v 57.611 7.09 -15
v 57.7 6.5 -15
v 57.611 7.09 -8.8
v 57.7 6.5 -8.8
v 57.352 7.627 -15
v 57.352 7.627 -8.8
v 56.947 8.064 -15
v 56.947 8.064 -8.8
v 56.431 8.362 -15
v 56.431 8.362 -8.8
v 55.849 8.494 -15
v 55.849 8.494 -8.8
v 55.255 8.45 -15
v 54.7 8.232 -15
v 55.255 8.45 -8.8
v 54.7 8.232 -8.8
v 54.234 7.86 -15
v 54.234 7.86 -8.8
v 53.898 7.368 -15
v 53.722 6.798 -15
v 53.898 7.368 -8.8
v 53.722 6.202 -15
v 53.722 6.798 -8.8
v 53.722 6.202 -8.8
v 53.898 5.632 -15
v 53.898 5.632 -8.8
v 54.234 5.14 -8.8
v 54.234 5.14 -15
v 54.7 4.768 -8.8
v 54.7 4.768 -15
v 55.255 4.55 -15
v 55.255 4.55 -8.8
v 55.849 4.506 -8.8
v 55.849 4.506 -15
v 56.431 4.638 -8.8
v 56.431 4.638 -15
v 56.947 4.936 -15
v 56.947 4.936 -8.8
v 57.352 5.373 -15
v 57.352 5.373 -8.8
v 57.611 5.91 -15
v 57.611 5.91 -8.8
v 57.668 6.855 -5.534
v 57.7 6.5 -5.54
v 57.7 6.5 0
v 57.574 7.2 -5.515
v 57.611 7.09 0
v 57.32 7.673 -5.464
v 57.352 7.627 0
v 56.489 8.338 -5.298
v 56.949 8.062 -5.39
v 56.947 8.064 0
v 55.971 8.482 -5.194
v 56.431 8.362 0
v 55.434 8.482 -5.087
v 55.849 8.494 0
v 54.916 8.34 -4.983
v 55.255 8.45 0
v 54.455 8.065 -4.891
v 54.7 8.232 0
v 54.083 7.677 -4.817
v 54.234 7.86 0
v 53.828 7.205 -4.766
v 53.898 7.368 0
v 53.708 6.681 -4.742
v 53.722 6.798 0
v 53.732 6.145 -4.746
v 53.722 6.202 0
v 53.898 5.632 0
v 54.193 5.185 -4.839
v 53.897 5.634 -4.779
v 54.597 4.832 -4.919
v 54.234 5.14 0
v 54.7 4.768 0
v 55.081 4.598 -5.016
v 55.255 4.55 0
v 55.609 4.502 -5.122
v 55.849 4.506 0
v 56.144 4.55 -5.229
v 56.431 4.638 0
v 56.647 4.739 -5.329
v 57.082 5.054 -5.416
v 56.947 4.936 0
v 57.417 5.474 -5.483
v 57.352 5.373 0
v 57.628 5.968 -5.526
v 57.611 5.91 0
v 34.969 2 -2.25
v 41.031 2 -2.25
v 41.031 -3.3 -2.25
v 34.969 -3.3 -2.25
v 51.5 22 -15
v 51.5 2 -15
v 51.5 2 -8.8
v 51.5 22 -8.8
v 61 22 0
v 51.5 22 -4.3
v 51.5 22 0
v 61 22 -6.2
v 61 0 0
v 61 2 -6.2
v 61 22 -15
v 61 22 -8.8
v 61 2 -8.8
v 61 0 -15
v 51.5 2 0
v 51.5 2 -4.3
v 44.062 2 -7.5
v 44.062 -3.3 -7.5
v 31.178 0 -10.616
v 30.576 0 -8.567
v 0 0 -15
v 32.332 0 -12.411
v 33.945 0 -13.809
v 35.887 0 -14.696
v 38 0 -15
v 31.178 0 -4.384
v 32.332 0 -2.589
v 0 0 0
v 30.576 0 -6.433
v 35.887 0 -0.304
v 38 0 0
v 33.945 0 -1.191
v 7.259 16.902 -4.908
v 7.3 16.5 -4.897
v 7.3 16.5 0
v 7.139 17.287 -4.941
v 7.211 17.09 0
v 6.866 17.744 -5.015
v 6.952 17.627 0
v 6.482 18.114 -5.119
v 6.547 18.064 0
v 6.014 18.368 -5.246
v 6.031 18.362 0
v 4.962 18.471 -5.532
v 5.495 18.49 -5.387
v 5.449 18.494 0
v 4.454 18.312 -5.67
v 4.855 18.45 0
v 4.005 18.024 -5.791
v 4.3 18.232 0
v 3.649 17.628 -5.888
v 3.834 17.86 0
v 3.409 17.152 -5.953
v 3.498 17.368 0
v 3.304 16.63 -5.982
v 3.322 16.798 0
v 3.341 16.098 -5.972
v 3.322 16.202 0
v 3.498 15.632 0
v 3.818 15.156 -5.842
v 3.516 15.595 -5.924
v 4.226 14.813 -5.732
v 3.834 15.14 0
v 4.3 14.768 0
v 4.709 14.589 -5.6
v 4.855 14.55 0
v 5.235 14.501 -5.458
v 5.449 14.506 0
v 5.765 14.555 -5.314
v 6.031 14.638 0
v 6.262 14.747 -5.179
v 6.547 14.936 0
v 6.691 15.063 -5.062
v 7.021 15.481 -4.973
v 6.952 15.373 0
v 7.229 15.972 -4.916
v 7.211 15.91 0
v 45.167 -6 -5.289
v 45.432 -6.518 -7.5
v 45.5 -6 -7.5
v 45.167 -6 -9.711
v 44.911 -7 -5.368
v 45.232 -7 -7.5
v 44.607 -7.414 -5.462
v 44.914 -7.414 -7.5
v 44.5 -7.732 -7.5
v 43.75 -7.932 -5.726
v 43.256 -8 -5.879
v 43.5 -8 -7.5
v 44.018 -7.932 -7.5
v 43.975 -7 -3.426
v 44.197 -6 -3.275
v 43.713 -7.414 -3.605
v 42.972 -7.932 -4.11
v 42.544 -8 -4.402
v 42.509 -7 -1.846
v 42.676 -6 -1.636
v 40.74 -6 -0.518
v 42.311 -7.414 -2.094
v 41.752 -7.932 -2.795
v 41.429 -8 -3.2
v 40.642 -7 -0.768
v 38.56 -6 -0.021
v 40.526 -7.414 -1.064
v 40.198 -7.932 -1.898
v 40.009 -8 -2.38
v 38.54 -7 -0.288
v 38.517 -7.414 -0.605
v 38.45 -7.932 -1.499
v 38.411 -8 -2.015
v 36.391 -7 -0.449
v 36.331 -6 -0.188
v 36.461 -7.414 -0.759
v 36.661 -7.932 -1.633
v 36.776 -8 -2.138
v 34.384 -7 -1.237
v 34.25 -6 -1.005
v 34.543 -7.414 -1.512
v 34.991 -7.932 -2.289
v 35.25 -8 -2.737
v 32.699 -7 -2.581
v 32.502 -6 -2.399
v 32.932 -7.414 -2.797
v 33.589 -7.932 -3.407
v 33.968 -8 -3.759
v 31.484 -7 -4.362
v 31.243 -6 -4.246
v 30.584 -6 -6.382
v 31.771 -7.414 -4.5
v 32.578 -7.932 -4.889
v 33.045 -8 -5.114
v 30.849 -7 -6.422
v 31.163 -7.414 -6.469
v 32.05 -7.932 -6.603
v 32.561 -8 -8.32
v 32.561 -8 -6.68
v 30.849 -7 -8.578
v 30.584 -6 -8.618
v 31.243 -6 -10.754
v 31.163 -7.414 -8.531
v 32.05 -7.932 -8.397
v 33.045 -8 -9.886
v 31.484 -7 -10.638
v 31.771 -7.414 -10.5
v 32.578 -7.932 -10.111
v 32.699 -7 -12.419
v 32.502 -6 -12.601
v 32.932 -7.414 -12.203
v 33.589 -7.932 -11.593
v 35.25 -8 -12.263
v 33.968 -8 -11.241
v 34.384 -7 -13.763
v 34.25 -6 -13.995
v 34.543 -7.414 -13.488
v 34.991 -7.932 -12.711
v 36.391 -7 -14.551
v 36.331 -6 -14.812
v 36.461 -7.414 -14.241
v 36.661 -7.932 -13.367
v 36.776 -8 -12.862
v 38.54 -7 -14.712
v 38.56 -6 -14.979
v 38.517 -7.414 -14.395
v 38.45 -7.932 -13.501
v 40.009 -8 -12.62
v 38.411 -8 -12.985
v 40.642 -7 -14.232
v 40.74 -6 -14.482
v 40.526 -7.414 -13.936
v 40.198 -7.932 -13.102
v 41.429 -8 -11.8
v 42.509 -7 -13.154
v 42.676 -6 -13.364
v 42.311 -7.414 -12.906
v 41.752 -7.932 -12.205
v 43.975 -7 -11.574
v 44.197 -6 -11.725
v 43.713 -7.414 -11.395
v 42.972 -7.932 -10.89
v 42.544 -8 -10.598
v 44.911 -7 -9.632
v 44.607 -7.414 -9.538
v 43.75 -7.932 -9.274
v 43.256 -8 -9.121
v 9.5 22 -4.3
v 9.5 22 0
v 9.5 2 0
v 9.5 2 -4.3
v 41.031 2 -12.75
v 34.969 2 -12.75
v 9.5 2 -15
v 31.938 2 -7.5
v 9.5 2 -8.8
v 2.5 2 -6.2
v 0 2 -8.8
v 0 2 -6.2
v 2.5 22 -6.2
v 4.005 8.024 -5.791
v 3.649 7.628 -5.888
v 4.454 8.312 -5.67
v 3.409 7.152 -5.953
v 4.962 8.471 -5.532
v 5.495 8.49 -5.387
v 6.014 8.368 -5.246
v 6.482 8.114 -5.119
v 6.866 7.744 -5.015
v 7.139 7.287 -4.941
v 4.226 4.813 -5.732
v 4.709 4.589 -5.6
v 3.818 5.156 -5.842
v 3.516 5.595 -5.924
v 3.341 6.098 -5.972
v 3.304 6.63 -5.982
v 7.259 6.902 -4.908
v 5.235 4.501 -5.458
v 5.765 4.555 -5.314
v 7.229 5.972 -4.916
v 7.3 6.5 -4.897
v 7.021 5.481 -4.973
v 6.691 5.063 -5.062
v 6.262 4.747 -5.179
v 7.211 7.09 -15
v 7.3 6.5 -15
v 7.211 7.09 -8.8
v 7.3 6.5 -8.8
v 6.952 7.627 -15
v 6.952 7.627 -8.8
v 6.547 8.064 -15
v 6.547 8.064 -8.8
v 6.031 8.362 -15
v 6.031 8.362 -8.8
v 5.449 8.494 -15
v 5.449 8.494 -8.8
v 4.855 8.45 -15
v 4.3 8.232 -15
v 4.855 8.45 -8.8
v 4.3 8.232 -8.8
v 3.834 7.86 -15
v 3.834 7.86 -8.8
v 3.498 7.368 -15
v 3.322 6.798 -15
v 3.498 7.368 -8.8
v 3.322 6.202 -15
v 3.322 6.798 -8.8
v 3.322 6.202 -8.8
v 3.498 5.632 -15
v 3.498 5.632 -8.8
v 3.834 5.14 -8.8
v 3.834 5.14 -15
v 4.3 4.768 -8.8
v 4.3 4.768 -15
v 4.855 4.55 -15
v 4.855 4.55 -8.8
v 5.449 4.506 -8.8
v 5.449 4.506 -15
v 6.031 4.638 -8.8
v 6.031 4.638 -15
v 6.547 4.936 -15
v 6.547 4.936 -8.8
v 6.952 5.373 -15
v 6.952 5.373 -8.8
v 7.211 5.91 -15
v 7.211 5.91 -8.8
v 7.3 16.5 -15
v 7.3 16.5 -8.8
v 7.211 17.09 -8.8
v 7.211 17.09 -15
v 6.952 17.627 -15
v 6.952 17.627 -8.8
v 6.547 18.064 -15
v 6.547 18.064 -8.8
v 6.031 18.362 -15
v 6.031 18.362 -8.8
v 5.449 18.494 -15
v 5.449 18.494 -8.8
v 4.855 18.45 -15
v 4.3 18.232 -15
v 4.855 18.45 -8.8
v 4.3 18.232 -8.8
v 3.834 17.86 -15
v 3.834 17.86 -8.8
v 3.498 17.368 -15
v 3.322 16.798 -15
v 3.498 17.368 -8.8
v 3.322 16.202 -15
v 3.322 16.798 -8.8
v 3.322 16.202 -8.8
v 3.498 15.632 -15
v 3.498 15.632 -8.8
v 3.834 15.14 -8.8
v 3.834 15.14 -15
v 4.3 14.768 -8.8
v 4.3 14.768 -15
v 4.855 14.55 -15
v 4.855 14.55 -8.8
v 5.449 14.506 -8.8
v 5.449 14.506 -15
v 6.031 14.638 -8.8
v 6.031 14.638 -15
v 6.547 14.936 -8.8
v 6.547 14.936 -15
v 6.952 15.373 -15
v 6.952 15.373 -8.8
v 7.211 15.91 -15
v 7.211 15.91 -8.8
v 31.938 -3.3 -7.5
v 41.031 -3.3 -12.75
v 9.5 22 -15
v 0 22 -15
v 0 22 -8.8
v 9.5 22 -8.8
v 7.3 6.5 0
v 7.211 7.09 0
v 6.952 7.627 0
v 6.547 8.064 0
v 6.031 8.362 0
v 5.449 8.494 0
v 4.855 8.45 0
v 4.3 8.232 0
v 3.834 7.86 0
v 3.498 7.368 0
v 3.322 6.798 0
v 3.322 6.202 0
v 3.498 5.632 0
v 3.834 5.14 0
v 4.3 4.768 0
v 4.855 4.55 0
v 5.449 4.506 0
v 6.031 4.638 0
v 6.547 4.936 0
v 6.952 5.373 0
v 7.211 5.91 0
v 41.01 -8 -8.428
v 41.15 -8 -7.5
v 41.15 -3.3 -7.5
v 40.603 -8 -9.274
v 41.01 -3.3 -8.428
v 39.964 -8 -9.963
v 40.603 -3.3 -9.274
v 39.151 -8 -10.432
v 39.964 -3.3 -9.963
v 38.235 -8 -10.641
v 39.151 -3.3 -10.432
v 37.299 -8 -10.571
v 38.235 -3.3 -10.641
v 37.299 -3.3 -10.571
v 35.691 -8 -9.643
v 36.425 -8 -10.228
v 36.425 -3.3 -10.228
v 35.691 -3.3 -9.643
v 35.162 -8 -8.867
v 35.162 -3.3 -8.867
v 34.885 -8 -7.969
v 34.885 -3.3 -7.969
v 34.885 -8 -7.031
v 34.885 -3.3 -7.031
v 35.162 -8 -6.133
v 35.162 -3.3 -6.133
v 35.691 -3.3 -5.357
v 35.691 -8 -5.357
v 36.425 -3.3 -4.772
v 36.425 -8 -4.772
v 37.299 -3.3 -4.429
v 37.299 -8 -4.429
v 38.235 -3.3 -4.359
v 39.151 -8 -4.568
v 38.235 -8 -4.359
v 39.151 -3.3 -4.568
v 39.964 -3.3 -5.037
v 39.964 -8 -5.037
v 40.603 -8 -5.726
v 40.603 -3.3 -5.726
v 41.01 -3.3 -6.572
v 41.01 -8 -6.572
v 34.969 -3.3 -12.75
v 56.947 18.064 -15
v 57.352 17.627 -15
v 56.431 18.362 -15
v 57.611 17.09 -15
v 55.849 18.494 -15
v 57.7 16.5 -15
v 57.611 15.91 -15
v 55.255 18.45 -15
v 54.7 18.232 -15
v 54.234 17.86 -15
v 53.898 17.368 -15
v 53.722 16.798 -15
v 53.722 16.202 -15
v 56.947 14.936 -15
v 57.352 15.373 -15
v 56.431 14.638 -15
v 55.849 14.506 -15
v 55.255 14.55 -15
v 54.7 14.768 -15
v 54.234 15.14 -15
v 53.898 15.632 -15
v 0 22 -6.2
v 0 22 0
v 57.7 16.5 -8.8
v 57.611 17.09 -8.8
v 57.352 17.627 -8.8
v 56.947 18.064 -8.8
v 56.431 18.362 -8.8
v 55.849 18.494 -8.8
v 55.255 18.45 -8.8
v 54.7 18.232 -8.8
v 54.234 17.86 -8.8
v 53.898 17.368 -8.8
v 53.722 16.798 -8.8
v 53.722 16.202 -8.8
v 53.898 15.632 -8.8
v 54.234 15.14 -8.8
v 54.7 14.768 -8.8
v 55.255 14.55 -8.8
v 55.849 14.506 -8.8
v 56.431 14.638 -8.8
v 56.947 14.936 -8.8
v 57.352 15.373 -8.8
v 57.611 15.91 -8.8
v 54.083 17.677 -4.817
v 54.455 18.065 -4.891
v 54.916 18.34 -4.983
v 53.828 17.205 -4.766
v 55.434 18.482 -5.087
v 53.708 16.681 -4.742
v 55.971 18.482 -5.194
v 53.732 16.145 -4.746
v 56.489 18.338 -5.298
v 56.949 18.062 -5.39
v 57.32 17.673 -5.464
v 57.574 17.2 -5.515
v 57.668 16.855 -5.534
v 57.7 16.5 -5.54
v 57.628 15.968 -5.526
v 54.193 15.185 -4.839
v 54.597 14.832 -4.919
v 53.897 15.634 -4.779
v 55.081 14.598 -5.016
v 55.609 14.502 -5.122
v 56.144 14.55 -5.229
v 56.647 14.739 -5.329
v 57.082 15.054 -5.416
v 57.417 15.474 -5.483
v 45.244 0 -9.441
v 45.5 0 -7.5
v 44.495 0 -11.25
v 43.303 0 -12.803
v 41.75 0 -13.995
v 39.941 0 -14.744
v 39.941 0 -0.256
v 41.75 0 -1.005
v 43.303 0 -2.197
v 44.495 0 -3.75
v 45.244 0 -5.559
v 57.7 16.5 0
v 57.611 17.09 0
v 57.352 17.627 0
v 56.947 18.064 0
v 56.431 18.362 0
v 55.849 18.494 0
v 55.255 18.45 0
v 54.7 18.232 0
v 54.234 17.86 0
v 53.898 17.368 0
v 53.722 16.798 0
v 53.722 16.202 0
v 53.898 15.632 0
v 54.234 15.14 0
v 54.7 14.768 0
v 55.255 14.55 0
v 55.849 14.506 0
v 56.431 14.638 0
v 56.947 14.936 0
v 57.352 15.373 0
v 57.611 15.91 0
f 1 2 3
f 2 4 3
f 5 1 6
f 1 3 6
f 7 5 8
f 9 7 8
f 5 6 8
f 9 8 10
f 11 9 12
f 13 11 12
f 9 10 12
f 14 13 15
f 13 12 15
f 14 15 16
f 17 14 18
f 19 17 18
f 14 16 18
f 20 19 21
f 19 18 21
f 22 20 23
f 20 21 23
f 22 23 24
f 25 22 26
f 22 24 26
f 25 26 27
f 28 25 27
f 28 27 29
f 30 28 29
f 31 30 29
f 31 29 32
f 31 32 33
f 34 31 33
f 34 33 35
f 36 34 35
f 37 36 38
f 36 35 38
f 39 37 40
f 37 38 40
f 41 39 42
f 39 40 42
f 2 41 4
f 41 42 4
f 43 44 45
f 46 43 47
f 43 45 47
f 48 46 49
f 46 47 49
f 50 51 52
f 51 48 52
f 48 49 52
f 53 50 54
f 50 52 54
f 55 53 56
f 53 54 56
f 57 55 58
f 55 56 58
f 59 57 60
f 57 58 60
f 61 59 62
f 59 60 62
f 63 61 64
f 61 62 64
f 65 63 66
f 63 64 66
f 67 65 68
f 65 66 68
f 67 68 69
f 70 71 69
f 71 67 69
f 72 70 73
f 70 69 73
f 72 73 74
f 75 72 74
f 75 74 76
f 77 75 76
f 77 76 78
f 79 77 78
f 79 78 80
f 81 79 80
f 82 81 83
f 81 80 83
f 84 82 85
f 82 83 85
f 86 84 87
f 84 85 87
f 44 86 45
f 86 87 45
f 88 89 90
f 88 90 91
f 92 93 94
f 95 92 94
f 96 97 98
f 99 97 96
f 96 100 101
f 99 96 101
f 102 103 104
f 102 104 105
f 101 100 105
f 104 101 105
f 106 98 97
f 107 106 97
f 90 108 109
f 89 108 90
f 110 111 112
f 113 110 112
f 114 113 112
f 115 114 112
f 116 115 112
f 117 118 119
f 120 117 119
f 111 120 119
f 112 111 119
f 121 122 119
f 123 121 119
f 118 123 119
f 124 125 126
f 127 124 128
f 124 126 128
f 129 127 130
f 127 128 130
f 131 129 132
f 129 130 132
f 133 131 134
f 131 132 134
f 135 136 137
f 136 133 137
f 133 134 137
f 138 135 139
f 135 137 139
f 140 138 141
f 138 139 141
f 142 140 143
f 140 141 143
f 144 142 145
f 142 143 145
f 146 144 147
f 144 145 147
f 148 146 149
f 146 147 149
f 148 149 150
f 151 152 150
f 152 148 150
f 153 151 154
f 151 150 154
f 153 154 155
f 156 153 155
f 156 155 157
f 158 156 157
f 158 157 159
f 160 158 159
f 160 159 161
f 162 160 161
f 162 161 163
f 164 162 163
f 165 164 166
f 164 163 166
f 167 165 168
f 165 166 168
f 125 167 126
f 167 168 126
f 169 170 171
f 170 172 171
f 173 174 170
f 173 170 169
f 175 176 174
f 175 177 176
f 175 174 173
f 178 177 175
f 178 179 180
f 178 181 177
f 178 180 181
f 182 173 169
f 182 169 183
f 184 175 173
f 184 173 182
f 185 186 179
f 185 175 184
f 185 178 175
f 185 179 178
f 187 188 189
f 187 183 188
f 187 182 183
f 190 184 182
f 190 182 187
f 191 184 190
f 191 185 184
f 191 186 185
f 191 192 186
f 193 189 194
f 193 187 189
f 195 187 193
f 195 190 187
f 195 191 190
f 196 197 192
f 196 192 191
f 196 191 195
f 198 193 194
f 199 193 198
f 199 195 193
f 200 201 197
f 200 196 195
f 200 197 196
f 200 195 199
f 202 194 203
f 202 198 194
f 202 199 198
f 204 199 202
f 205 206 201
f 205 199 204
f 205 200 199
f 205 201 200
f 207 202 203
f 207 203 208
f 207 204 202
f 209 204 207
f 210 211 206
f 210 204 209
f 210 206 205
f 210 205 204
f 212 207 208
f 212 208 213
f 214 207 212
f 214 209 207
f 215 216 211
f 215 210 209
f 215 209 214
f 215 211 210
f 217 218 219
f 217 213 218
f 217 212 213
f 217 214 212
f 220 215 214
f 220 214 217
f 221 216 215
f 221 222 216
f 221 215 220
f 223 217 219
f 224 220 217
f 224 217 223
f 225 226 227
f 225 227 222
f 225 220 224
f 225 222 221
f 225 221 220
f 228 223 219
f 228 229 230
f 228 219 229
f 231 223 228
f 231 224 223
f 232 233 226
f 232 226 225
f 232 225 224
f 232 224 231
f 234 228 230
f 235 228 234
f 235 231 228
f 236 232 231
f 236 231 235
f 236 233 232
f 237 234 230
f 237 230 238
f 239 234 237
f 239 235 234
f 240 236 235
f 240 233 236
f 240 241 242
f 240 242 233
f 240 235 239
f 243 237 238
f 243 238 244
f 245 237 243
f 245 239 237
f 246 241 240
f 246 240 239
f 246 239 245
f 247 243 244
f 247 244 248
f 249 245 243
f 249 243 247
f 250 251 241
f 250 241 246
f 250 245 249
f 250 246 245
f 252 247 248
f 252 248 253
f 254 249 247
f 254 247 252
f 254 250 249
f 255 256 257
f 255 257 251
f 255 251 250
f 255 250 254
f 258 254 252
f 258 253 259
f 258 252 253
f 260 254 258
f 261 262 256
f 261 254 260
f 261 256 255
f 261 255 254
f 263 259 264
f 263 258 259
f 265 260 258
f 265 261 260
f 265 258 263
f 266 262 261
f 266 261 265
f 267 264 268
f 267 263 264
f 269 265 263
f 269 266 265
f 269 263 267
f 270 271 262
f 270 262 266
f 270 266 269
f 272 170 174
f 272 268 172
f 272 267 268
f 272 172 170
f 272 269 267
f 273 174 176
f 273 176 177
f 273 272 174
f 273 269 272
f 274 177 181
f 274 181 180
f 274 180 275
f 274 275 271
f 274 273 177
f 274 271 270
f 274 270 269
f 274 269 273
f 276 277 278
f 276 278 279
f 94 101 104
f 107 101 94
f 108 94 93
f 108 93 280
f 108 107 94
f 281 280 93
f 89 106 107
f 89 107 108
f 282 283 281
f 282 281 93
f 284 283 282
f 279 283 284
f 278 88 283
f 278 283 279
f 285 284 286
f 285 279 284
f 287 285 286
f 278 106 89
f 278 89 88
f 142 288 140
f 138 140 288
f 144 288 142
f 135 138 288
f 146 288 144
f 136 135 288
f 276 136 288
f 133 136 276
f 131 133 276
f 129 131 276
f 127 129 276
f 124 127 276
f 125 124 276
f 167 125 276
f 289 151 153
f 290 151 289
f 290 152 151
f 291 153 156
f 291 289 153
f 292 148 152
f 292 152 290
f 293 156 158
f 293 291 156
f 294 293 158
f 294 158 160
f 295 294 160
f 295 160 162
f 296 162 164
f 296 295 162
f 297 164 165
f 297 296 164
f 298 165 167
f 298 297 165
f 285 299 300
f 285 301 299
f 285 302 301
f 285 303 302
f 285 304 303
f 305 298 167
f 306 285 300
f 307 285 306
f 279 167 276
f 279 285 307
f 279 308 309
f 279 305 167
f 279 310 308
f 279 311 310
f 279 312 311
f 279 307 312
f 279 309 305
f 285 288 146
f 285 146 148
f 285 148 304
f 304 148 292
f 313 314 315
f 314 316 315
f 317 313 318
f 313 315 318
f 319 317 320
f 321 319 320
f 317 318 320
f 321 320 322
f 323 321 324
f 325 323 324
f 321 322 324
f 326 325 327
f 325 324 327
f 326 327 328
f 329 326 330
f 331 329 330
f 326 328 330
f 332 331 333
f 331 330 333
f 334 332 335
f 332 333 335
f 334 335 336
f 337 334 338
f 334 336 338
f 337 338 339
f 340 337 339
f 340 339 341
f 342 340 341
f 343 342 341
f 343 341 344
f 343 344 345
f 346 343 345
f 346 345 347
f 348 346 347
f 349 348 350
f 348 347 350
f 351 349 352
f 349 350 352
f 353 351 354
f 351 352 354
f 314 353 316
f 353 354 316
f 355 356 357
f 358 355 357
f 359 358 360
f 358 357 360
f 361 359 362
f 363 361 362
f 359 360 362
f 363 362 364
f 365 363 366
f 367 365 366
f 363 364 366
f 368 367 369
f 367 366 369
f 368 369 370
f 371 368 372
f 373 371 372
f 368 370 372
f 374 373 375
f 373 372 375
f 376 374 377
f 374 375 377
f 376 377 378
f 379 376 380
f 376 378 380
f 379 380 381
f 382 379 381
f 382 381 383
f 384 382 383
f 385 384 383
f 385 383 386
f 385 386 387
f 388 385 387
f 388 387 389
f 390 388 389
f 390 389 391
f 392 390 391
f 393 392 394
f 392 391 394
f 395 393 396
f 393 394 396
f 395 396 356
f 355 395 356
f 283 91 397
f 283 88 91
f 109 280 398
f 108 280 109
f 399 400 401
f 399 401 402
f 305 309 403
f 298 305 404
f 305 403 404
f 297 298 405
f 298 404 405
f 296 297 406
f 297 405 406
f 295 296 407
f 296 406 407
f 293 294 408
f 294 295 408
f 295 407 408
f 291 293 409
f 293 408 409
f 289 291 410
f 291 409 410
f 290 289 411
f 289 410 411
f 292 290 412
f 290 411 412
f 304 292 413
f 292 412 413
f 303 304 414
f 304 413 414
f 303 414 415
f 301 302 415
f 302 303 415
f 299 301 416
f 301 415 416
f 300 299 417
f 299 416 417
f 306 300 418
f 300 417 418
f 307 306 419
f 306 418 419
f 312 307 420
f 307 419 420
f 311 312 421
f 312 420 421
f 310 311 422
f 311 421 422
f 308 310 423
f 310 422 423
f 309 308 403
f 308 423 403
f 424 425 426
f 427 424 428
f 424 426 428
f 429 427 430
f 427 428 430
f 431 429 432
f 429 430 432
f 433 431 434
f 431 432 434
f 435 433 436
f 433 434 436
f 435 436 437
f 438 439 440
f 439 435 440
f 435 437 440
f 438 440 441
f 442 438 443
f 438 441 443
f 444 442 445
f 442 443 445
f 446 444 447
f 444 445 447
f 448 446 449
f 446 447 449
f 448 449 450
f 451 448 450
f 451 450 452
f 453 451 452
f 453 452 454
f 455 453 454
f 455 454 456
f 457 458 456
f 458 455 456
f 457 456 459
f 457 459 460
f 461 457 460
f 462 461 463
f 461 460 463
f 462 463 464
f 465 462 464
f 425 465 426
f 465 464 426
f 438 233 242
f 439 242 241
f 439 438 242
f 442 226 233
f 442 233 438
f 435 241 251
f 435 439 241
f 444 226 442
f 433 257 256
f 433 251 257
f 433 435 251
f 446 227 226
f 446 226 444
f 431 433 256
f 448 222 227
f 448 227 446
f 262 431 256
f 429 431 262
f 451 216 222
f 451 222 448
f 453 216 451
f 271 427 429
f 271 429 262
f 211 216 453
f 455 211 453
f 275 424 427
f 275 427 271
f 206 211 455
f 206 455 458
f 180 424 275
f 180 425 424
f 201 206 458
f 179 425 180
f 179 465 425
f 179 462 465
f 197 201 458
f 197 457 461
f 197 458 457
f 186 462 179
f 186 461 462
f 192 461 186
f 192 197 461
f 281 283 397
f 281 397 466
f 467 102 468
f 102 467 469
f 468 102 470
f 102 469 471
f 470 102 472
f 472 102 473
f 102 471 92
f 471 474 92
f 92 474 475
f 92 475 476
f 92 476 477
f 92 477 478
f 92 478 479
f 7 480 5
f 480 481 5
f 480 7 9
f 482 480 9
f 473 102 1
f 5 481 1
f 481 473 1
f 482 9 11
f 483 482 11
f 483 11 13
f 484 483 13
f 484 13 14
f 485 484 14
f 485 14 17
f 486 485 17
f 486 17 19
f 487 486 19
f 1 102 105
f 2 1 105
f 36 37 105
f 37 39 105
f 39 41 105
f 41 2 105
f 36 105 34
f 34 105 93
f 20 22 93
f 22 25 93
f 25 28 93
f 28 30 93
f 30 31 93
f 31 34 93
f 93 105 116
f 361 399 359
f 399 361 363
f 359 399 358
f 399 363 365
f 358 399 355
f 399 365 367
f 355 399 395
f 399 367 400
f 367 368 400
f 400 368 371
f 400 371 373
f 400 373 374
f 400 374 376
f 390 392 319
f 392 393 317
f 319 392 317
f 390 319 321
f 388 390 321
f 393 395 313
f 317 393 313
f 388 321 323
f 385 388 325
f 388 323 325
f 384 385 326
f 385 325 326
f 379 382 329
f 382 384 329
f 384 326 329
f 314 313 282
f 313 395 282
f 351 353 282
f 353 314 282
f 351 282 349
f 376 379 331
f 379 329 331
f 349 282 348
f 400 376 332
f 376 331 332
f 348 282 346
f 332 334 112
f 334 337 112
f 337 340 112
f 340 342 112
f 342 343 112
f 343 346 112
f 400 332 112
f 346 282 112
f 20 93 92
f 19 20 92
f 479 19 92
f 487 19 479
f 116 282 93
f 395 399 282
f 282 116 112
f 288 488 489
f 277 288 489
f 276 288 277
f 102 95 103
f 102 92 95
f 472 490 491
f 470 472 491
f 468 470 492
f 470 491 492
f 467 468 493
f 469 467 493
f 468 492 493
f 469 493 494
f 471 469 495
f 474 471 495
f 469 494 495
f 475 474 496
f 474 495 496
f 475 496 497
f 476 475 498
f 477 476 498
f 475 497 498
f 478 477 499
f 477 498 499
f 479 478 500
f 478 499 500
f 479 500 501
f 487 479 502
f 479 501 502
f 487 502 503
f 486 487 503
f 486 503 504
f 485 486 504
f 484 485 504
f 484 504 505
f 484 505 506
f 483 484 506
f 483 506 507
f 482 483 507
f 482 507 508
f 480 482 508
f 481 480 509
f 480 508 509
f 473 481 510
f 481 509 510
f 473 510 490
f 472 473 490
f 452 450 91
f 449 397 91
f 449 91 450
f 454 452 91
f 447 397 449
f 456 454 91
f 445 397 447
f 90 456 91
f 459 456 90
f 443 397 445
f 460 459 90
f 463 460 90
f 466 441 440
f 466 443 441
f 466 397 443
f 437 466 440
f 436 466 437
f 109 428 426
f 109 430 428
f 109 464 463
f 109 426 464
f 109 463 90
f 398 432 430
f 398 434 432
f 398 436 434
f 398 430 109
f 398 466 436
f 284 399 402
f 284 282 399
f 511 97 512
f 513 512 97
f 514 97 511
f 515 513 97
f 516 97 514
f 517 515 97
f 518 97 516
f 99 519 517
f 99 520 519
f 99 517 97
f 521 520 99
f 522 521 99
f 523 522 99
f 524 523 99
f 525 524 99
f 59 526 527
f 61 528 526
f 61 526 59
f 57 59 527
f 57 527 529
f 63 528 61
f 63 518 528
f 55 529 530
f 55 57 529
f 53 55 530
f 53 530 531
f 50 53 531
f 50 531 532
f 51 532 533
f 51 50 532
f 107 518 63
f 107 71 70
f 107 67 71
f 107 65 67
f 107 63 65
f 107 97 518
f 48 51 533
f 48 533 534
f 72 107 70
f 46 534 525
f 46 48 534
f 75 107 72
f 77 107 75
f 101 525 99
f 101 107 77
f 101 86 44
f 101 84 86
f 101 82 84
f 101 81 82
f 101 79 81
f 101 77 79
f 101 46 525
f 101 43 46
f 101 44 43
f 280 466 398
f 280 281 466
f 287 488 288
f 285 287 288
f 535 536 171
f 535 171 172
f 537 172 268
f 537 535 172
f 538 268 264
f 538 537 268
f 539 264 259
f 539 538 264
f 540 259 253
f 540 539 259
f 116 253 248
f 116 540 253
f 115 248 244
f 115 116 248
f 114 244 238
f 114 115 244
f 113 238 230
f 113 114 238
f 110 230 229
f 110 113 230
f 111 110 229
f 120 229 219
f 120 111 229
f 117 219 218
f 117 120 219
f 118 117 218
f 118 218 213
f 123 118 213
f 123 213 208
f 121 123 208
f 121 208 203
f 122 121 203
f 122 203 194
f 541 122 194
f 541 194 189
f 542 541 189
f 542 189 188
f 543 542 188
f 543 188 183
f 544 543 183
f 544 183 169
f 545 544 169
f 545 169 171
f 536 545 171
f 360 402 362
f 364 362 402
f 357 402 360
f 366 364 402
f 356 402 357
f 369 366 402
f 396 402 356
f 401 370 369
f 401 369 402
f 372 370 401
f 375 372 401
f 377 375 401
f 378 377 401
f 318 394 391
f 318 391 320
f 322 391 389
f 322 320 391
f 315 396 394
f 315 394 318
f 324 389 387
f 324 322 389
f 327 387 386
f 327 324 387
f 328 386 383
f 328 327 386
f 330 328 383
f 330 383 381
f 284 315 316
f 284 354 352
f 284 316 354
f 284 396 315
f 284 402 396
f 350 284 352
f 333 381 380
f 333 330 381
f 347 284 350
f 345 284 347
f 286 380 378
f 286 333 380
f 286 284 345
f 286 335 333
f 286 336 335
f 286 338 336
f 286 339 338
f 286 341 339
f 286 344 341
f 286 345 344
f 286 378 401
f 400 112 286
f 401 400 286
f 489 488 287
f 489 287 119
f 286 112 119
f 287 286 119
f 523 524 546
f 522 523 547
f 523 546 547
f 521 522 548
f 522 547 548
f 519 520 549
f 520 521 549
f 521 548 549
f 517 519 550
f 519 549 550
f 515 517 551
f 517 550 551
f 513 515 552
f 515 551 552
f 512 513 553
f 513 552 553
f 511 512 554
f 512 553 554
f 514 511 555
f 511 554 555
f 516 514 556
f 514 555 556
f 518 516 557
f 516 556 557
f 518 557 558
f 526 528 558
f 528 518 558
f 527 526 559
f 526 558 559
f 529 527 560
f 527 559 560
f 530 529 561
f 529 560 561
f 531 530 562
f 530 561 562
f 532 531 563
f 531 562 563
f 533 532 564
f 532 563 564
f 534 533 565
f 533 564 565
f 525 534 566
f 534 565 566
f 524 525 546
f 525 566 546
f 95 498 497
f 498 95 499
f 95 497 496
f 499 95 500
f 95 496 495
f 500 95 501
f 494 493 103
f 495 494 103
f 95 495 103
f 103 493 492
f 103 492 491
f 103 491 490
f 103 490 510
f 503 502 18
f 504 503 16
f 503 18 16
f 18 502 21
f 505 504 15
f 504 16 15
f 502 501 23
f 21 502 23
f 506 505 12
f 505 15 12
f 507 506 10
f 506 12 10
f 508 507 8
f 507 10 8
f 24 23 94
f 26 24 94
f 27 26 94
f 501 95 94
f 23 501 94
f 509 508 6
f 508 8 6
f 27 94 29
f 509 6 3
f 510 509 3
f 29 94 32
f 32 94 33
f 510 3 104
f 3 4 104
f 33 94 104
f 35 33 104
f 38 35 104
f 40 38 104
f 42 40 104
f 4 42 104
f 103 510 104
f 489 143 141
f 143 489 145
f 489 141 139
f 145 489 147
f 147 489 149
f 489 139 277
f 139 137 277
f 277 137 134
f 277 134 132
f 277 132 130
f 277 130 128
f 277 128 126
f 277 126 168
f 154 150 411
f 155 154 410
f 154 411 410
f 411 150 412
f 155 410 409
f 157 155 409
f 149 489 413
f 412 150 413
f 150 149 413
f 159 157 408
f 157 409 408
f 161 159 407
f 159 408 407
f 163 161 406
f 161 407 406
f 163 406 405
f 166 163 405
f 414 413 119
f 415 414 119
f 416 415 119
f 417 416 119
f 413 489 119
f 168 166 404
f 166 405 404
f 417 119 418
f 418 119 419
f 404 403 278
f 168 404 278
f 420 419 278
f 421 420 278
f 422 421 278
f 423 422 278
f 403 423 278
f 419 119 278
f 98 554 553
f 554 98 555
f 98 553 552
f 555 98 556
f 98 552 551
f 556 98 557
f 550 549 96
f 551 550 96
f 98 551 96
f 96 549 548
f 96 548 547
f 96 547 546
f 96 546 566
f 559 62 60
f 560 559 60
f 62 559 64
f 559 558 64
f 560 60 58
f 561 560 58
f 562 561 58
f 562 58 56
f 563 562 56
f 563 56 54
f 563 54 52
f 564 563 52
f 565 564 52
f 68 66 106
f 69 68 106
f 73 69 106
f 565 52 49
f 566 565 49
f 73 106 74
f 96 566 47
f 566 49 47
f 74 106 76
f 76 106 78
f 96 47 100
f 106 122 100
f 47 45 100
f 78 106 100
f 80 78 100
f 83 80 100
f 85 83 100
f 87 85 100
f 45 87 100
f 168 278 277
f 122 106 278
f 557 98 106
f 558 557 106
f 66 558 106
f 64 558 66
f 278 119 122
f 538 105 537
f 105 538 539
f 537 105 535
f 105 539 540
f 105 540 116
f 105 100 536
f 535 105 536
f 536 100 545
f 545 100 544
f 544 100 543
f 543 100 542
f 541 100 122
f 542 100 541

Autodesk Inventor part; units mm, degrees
ref_plane "YZ Plane" through (0, 0, 0) normal (1, 0, 0) x (0, 1, 0)
ref_plane "XZ Plane" through (0, 0, 0) normal (0, 1, 0) x (-1, 0, 0)
ref_plane "XY Plane" through (0, 0, 0) normal (0, 0, 1) x (1, 0, 0)
sketch "Esquisse1" plane through (0, 0, 0) normal (0, 1, 0) x (-1, 0, 0)
  line L0 (0, 0) -> (-61, 0)
  line L1 (-61, 0) -> (-61, -15)
  line L2 (-61, -15) -> (0, -15)
  line L3 (0, -15) -> (0, 0)
  dimension "d0" = 15
  dimension "d1" = 61
extrude "Extrusion1" add sketch "Esquisse1" along normal blind 2
sketch "Esquisse2" plane through (0, 2, 0) normal (0, 1, 0) x (1, 0, 0)
  line L0 (0, 15) -> (0, 0) projected
  line L1 (0, 0) -> (9.5, 0)
  line L2 (9.5, 0) -> (9.5, 4.3)
  line L3 (0, 6.2) -> (0, 0)
  line L4 (0, 15) -> (9.5, 15)
  line L5 (9.5, 15) -> (9.5, 8.8)
  line L6 (9.5, 8.8) -> (0, 8.8)
  line L7 (0, 8.8) -> (0, 15)
  line L8 (0, 0) -> (61, 0) construction
  line L9 (30.5, 0) -> (30.5, 15) construction
  line L10 (61, 15) -> (61, 0)
  line L11 (61, 0) -> (51.5, 0)
  line L12 (51.5, 0) -> (51.5, 4.3)
  line L13 (51.5, 4.3) -> (61, 6.2)
  line L14 (61, 6.2) -> (61, 0)
  line L15 (61, 15) -> (51.5, 15)
  line L16 (51.5, 15) -> (51.5, 8.8)
  line L17 (51.5, 8.8) -> (61, 8.8)
  line L18 (61, 8.8) -> (61, 15)
  line L19 (0, 6.2) -> (2.5, 6.2)
  line L20 (2.5, 6.2) -> (9.5, 4.3)
  dimension "d33" = 2.6
  dimension "d34" = 6.2
  dimension "d36" = 4.5
  dimension "d37" = 2.5
  dimension "d38" = 7
extrude "Extrusion2" add sketch "Esquisse2" along normal blind 20
sketch "Esquisse3" plane through (0, 0, 0) normal (0, 0, 1) x (1, 0, 0)
  circle A0 centre (55.7, 16.5) radius 2
  line L0 (51.5, 2) -> (51.5, 22) projected
  circle A1 centre (55.7, 6.5) radius 2
  line L1 (51.5, 22) -> (61, 22) projected
  line L2 (0, 0) -> (61, 0) projected
  line L3 (51.5, 2) -> (9.5, 2) construction
  line L4 (30.5, 0) -> (30.5, 2) construction
  line L5 (9.5, 2) -> (51.5, 2) construction
  circle A2 centre (5.3, 16.5) radius 2
  circle A3 centre (5.3, 6.5) radius 2
  dimension "d10" = 4
  dimension "d11" = 4.2
  dimension "d12" = 4.2
  dimension "d40" = 10
  dimension "d41" = 4.5
extrude "Extrusion3" cut sketch "Esquisse3" against normal blind 20
sketch "Esquisse4" plane through (0, 0, 0) normal (0, -1, 0) x (1, 0, 0)
  circle A0 centre (44, -7.5) radius 5.15
  circle A1 centre (44, -7.5) radius 3.15
  line L0 (61, -6.2) -> (61, -8.8) construction
  line L1 (0, -8.8) -> (0, -6.2) construction
  line L2 (0, -15) -> (0, 0) construction
  line L3 (0, 0) -> (61, 0) construction
  line L4 (9.5, 0) -> (51.5, 0) construction
  line L5 (44, 0) -> (44, -15) construction
  line L6 (61, 0) -> (61, -15) construction
  line L7 (61, -15) -> (0, -15) construction
  dimension "d18" = 6.3
  dimension "d19" = 2
  dimension "d21" = 17
sketch "Esquisse5" plane through (0, 2, 0) normal (0, 1, 0) x (1, 0, 0)
  circle A0 centre (38, 7.5) radius 3.15 projected
  line L0 (41.0311, 2.25) -> (34.9689, 2.25)
  line L1 (34.9689, 2.25) -> (31.9378, 7.5)
  line L2 (31.9378, 7.5) -> (34.9689, 12.75)
  line L3 (34.9689, 12.75) -> (41.0311, 12.75)
  line L4 (41.0311, 12.75) -> (44.0622, 7.5)
  line L5 (44.0622, 7.5) -> (41.0311, 2.25)
  line L6 (9.5, 0) -> (51.5, 0) projected
  point P0 (0, 0)
  dimension "d24" = 10.5
sketch "Esquisse7" plane through (0, 0, 0) normal (0, -1, 0) x (1, 0, 0)
  circle A0 centre (38, -7.5) radius 3.15 projected
  circle A1 centre (38, -7.5) radius 7.5
  line L0 (61, -15) -> (0, -15) projected
  point P0 (0, 0)
extrude "Extrusion6" add sketch "Esquisse7" along normal blind 8
extrude "Extrusion7" cut sketch "Esquisse5" against normal blind 5.3 contours A0 | L0 L1 L2 L3 L4 L5
fillet "Congé1" radius 2 1 edges at (30.5, -8, -7.5)
equation "\"d12\" = d11"
properties part number "exp0"
